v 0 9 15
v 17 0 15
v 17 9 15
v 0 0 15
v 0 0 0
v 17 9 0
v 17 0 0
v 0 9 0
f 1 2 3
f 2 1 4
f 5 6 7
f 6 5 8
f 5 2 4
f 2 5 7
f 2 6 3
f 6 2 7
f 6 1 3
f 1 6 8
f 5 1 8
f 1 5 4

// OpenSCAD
// Generated by SolidPython 1.0.1 on 2020-07-29 00:46:56


cube(size = [17, 9, 15]);
/***********************************************
*********      SolidPython code:      **********
************************************************
 
# import packages: SolidPython
from solid import *
from solid.utils import *
from itertools import chain, combinations, permutations


class Resize:

    def __init__(self, scad_file):
        self.scad_file = scad_file
        #self.scad_file = import_scad(scad_file)
        # cone/cylinder param:
        self.r1 = 0
        self.r2 = 0
        self.h = 0
        # rectangular prism param:
        self.w = 0
        self.l = 0
        # ellipse param:
        self.r = 0

    # import OpenScad code (file name corresponds to shape)


    # classify shape + parameters
    def assign(self, param1, param2, param3):
        if self.scad_file == 'cone.scad':
            self.r1 = param1
            self.r2 = param2
            self.h = param3
        elif self.scad_file == 'cylinder.scad':
            self.r1 = param1
            self.r2 = param2
            self.h = param3
        elif self.scad_file == 'rectangularPrism.scad':
            self.h = param1
            self.l = param2
            self.w = param3
        else:
            self.r = param1
            self.h = param2

    # resize parameters
    def iterate(self):
        x = range(3, 20, 2)
        i = 1
        if self.scad_file == 'cone.scad':
            tempList = list(permutations(x, 2))
            for temp in tempList:
                param1 = temp[0]
                param2 = temp[1]
                filepath = 'produced_scad_files/' + 'cone' + str(param1) + '_' + str(param2) + '_' + '.scad'
                scad_render_to_file(cylinder(h=param1, r1=param2, r2=0), filepath)

        elif self.scad_file == 'cylinder.scad':
            tempList = list(permutations(x, 3))
            for temp in tempList:
                param1 = temp[0]
                param2 = temp[1]
                filepath = 'produced_scad_files/' + 'cylinder' + str(param1) + '_' + str(param2) + '_' + '.scad'
                scad_render_to_file(cylinder(h=param1, r1=param2, r2=param2), filepath)

        elif self.scad_file == 'rectangularPrism.scad':
            tempList = list(permutations(x, 3))
            for temp in tempList:
                param1 = temp[0]
                param2 = temp[1]
                param3 = temp[2]
                filepath = 'produced_scad_files/' + 'rectangularPrism' + str(param1) + '_' + str(param2) + '_' + str(
                    param3) + '.scad'
                scad_render_to_file(cube(size=(param1, param2, param3)), filepath)

        elif self.scad_file == 'ellipse.scad':
            tempList = list(permutations(x, 4))
            for temp in tempList:
                param1 = temp[0]
                param2 = temp[1]
                param3 = temp[2]
                param4 = temp[3]
                filepath = 'produced_scad_files/' + 'ellipse' + str(param1) + '_' + str(param2) + '_' + str(param3) + '_' + str(param4) + '.scad'
                scad_render_to_file(scale([param1, param2, param3])(sphere(r=param4)), filepath)

    def render_to_scadfile(self):
        scad_render_to_file(scad, 'example.scad') 
 
************************************************/
